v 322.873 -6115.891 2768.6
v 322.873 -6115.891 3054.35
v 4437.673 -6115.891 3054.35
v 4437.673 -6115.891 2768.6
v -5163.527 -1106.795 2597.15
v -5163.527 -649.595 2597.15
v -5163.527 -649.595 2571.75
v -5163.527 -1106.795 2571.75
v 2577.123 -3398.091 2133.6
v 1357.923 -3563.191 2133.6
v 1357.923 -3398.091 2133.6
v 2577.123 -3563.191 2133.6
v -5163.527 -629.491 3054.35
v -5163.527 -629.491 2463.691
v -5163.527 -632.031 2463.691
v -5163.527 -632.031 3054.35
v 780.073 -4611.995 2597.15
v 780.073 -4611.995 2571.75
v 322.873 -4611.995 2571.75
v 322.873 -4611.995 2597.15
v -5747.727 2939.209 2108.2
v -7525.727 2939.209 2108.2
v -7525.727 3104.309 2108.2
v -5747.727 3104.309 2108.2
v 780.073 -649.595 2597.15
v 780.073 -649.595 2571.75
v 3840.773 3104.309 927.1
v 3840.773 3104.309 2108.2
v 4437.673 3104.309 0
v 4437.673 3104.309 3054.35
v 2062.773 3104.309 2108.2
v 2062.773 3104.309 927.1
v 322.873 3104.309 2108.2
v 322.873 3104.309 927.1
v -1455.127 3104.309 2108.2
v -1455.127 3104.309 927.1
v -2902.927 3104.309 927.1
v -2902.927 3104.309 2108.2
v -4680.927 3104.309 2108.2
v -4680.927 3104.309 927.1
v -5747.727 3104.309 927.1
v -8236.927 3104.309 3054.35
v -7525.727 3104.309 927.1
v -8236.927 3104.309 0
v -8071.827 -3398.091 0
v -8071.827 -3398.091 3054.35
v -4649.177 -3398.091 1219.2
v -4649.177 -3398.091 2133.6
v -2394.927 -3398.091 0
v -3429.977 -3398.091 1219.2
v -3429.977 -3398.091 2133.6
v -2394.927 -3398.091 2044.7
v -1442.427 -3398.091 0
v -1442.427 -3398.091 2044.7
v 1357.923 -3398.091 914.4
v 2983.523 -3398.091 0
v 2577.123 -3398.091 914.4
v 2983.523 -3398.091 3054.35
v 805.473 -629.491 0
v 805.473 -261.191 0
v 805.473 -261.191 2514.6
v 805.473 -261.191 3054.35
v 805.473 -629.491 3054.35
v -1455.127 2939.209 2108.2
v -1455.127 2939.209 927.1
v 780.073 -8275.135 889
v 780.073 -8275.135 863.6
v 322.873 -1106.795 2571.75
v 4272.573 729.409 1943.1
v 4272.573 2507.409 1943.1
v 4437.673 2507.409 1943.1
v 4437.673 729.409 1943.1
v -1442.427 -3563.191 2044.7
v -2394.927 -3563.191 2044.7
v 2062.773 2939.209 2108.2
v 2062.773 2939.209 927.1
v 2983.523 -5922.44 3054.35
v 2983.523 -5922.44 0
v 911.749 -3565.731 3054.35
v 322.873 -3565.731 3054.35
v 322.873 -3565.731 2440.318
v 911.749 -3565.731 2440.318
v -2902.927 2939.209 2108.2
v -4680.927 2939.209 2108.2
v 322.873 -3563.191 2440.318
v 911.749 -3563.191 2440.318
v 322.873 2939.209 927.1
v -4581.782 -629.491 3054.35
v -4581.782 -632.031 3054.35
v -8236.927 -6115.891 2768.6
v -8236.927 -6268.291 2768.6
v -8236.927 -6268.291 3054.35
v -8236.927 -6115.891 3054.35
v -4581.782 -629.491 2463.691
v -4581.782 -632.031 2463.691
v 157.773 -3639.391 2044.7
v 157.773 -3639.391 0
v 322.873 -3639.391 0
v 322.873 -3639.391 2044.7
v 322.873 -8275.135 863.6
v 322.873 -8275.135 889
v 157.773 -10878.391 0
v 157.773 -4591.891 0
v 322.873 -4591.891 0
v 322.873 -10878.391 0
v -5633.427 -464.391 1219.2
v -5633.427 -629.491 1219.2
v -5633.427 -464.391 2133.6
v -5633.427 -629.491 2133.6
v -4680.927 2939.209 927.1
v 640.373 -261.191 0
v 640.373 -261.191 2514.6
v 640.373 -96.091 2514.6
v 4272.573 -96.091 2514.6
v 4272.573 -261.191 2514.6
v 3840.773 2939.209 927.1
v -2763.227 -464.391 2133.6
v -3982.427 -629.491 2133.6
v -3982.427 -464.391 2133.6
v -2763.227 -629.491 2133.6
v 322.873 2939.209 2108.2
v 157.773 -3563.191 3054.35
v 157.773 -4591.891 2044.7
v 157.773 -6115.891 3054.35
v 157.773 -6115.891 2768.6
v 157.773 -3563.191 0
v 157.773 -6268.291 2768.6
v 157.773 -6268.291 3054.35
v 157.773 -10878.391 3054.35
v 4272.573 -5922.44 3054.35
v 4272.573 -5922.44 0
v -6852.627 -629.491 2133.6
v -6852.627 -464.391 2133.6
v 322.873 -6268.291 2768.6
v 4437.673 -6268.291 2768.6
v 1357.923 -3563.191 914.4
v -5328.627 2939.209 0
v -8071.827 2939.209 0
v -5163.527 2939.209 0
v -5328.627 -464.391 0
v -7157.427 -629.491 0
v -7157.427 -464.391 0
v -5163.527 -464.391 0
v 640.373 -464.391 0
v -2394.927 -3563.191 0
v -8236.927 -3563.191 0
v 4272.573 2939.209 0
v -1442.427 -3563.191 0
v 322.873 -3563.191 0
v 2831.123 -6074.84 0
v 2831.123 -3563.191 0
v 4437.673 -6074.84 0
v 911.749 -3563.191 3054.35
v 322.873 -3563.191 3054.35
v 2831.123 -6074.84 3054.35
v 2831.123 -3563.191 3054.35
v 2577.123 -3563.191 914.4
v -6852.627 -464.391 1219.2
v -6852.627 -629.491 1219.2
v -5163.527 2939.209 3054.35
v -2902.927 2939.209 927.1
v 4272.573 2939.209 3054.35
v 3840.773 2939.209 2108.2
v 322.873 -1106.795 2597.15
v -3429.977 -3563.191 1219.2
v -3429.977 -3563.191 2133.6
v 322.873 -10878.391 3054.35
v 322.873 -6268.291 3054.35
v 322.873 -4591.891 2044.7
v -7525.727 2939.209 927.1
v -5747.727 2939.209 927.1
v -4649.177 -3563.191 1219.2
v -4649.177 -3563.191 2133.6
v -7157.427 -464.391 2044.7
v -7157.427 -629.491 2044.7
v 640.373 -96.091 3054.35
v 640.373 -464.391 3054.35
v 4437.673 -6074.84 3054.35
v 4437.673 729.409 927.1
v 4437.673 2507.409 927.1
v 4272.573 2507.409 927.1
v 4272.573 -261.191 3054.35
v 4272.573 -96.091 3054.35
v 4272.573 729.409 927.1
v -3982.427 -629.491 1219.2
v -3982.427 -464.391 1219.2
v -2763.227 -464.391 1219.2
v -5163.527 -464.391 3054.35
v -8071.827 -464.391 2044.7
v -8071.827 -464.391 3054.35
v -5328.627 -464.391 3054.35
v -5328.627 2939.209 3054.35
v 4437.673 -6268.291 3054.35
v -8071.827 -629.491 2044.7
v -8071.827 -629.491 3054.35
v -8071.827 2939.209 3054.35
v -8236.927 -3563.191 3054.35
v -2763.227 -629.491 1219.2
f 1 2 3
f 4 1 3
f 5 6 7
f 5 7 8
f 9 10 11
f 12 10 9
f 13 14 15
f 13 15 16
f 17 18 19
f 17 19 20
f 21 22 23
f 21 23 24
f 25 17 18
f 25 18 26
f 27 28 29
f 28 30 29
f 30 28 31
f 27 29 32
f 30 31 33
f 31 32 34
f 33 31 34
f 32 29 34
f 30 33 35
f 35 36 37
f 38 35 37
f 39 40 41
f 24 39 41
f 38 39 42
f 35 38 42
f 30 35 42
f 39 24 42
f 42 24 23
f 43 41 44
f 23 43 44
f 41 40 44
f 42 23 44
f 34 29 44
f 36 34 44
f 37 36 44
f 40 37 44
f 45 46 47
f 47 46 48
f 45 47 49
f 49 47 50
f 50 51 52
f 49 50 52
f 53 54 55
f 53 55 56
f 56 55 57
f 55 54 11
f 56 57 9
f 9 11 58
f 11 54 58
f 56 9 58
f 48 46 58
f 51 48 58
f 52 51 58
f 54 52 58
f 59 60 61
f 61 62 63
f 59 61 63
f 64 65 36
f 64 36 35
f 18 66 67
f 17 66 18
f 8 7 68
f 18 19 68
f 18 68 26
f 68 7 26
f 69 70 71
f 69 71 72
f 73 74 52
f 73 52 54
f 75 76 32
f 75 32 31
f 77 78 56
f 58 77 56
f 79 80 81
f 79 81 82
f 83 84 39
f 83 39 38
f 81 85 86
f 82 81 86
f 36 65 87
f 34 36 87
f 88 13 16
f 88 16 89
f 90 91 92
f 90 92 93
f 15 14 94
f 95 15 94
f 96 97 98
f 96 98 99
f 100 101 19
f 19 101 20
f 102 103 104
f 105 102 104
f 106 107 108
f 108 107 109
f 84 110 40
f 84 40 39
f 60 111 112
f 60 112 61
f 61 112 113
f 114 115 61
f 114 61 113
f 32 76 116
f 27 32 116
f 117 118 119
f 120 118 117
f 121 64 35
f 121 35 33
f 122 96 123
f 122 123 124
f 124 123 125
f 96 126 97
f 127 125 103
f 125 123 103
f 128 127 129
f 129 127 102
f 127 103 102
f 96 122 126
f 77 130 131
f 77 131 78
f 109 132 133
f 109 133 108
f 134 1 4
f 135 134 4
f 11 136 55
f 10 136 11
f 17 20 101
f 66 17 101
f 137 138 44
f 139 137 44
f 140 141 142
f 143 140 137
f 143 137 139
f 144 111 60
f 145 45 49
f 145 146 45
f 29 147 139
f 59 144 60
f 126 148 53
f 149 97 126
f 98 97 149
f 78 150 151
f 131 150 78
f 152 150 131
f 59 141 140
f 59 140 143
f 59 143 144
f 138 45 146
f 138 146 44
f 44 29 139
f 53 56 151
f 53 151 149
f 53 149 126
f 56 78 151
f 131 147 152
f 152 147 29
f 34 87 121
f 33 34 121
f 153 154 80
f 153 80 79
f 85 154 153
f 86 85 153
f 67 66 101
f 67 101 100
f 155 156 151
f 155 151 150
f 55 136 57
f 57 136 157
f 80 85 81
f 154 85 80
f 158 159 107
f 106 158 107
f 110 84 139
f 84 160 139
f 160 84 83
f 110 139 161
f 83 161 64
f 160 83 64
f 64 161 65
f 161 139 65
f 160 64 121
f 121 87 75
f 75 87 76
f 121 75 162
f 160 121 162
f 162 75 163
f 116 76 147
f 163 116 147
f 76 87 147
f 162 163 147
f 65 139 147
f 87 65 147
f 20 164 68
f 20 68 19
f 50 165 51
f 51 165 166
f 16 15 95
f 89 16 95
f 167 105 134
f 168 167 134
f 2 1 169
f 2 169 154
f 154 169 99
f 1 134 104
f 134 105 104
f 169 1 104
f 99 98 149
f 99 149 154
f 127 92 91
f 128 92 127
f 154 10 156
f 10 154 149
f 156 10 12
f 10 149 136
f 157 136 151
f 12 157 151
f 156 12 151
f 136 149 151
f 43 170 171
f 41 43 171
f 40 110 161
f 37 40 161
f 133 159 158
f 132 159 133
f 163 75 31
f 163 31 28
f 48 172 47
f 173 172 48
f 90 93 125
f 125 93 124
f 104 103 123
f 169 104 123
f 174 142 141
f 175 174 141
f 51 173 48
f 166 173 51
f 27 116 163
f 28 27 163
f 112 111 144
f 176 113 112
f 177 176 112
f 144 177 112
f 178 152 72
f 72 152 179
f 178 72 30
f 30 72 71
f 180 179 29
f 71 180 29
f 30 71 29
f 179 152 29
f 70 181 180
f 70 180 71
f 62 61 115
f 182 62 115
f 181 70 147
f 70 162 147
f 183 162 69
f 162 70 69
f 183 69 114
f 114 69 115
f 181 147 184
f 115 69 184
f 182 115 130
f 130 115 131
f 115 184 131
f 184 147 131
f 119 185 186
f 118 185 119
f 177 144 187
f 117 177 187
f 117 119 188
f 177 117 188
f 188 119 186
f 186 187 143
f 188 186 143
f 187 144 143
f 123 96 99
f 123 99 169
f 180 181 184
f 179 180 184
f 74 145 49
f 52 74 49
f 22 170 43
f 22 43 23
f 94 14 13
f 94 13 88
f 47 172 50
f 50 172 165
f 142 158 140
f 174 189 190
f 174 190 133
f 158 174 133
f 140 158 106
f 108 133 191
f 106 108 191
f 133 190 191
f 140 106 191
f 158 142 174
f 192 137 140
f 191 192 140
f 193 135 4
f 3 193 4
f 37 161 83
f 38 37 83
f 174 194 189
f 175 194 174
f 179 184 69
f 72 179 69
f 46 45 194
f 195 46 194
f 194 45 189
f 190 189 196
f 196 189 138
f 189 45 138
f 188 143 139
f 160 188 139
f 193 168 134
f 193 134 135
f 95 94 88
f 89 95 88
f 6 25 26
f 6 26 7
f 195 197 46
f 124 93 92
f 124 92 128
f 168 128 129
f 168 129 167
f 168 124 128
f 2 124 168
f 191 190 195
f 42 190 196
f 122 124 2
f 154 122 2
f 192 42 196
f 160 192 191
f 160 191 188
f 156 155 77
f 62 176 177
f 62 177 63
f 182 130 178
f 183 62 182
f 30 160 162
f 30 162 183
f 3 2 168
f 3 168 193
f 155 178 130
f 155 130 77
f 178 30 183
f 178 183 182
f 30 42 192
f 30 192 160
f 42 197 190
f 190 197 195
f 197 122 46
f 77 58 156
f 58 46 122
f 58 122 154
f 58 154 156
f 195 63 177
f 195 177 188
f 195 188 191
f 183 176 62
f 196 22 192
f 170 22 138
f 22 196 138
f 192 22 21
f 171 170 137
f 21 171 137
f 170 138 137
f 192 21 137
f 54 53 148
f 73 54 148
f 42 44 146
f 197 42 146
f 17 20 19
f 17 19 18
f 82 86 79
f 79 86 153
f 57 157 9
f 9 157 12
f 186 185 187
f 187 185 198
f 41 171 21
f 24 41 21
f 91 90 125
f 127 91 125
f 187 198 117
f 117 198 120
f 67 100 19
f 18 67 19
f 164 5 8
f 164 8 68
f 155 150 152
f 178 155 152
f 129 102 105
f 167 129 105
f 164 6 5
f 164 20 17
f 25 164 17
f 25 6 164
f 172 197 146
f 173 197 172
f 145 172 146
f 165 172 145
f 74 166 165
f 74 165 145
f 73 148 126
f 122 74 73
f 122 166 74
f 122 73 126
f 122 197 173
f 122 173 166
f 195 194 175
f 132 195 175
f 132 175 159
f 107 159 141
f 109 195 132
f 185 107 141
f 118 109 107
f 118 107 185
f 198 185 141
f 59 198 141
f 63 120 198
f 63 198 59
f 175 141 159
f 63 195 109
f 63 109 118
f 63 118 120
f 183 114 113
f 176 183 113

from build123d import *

# Parameters (mm, degrees)
F1_DEPTH  = 3054.35
F2_W      = 1219.2
F2_H      = 914.4
F3_DEPTH  = 165.1
F4_W      = 1778
F4_H      = 1181.1
F5_DEPTH  = 165.101
F6_W      = 1778
F6_H      = 1016
F7_DEPTH  = 165.101
F11_DEPTH = 3054.35
F12_W     = 3467.1
F12_H     = 2514.6
F13_DEPTH = 165.1
F14_W     = 952.5
F14_H     = 2044.7
F15_DEPTH = 165.1
F16_W     = 914.4
F16_H     = 1009.65
F17_DEPTH = 165.1
F18_W     = 952.5
F18_H     = 1009.65
F19_DEPTH = 165.1
F20_W     = 12674.6
F20_H     = 152.4
F21_DEPTH = 285.75
F22_W     = 1219.2
F22_H     = 1219.2
F22_H_2   = 914.4
F23_DEPTH = 165.1
F24_W     = 368.3
F24_H     = 2514.6
F25_DEPTH = 165.1
F26_W     = 165.1
F26_H     = 203.2
F27_DEPTH = 2514.6
F30_DEPTH = 25.4
F32_DEPTH = 457.2
F33_W     = 588.8758589745
F33_H     = 614.0316539764
F34_DEPTH = 2.54
F35_W     = 581.7451477051
F35_H     = 590.6585269928
F36_DEPTH = 2.54


with BuildPart() as f1:
    # F0 (on Top) → F1 (new body)
    with BuildSketch(Plane.XY):
        Polygon((-8071.8270324707, -464.391151869), (-8071.8270324707, 2939.208848131), (-5328.6270324707, 2939.208848131), (-5328.6270324707, -464.391151869), (-7157.4270324707, -464.391151869), (-7157.4270324707, -629.491151869), (-5163.5270324707, -629.491151869), (-4249.1270324707, -629.491151869), (805.4729675293, -629.491151869), (805.4729675293, -464.391151869), (640.3729675293, -464.391151869), (-4249.1270324707, -464.391151869), (-5163.5270324707, -464.391151869), (-5163.5270324707, 2939.208848131), (4272.5729675293, 2939.208848131), (4272.5729675293, 48.6404670191), (4272.5729675293, -116.4595329809), (4272.5729675293, -3398.091151869), (4272.5729675293, -5922.4400688171), (2983.5229675293, -5922.4400688171), (2983.5229675293, -3398.091151869), (-1442.4270324707, -3398.091151869), (-1442.4270324707, -3563.191151869), (157.7729675293, -3563.191151869), (157.7729675293, -10878.391151869), (322.8729675293, -10878.391151869), (322.8729675293, -3563.191151869), (2831.1229675293, -3563.191151869), (2831.1229675293, -6074.8400688171), (4437.6729675293, -6074.8400688171), (4437.6729675293, -3398.091151869), (4437.6729675293, 3104.308848131), (-8236.9270324707, 3104.308848131), (-8236.9270324707, -3563.191151869), (-2394.9270324707, -3563.191151869), (-2394.9270324707, -3398.091151869), (-8071.8270324707, -3398.091151869), (-8071.8270324707, -629.491151869), align=None)
    extrude(amount=F1_DEPTH)

    # F2 (on face) → F3 (cut, through all)
    with BuildSketch(Plane.XZ.offset(629.491151869)):
        with Locations((-6243.0270324707, 1676.4)):
            Rectangle(F2_W, F2_H)
        with Locations((-3372.8270324707, 1676.4)):
            Rectangle(F2_W, F2_H)
    extrude(amount=-F3_DEPTH, mode=Mode.SUBTRACT)

    # F4 (on face) → F5 (cut, through all)
    with BuildSketch(Plane.XZ.offset(-2939.208848131)):
        with Locations((-6636.7270324707, 1517.65)):
            Rectangle(F4_W, F4_H)
        with Locations((-3791.9270324707, 1517.65)):
            Rectangle(F4_W, F4_H)
        with Locations((-566.1270324707, 1517.65)):
            Rectangle(F4_W, F4_H)
        with Locations((2951.7729675293, 1517.65)):
            Rectangle(F4_W, F4_H)
    extrude(amount=-F5_DEPTH, mode=Mode.SUBTRACT)

    # F6 (on face) → F7 (cut, through all)
    with BuildSketch(Plane(origin=(4272.5729675293, 0, 0), x_dir=(0, -1, 0), z_dir=(-1, 0, 0))):
        with Locations((-1618.408848131, 1435.1)):
            Rectangle(F6_W, F6_H)
    extrude(amount=-F7_DEPTH, mode=Mode.SUBTRACT)

    # F10 (on Top) → F11 (join, through all)
    with BuildSketch(Plane.XY):
        Polygon((4272.5729675293, -96.091151869), (640.3729675293, -96.091151869), (640.3729675293, -464.391151869), (805.4729675293, -464.391151869), (805.4729675293, -261.191151869), (4272.5729675293, -261.191151869), align=None)
    extrude(amount=F11_DEPTH)

    # F12 (on face) → F13 (cut, through all)
    with BuildSketch(Plane.XZ.offset(261.191151869)):
        with Locations((2539.0229675293, 1257.3)):
            Rectangle(F12_W, F12_H)
    extrude(amount=-F13_DEPTH, mode=Mode.SUBTRACT)

    # F14 (on face) → F15 (cut, through all)
    with BuildSketch(Plane(origin=(157.7729675293, 0, 0), x_dir=(0, -1, 0), z_dir=(-1, 0, 0))):
        with Locations((4115.641151869, 1022.35)):
            Rectangle(F14_W, F14_H)
    extrude(amount=-F15_DEPTH, mode=Mode.SUBTRACT)

    # F16 (on face) → F17 (join)
    with BuildSketch(Plane.XZ.offset(629.491151869)):
        with Locations((-7614.6270324707, 2549.525)):
            Rectangle(F16_W, F16_H)
    extrude(amount=-F17_DEPTH)

    # F18 (on face) → F19 (join)
    with BuildSketch(Plane.XZ.offset(3563.191151869)):
        with Locations((-1918.6770324707, 2549.525)):
            Rectangle(F18_W, F18_H)
    extrude(amount=-F19_DEPTH)

    # F20 (on face) → F21 (join)
    with BuildSketch(Plane.XY.offset(3054.35)):
        with Locations((-1899.6270324707, -6192.091151869)):
            Rectangle(F20_W, F20_H)
    extrude(amount=-F21_DEPTH)

    # F22 (on face) → F23 (cut, through all)
    with BuildSketch(Plane.XZ.offset(3563.191151869)):
        with Locations((1967.5229675293, 1524)):
            Rectangle(F22_W, F22_H)
        with Locations((-4039.5770324707, 1676.4)):
            Rectangle(F22_W, F22_H_2)
    extrude(amount=-F23_DEPTH, mode=Mode.SUBTRACT)

    # F24 (on face) → F25 (cut, through all)
    with BuildSketch(Plane.YZ.offset(805.4729675293)):
        with Locations((-280.241151869, 1257.3)):
            Rectangle(F24_W, F24_H)
    extrude(amount=-F25_DEPTH, mode=Mode.SUBTRACT)

    # F26 (on face) → F27 (join, through all)
    with BuildSketch(Plane(origin=(0, 0, 2514.6), x_dir=(1, 0, 0), z_dir=(0, 0, -1))):
        with Locations((722.9229675293, 362.791151869)):
            Rectangle(F26_W, F26_H)
    extrude(amount=F27_DEPTH)


with BuildPart() as f30:
    # F29 (on offset) → F30 (new body)
    with BuildSketch(Plane.XY.offset(2597.15)):
        Polygon((322.8729675293, -649.5954301834), (-5163.5270324707, -649.5954301834), (-5163.5270324707, -1106.7954301834), (322.8729675293, -1106.7954301834), (322.8729675293, -4611.9954301834), (780.0729675293, -4611.9954301834), (780.0729675293, -649.5954301834), align=None)
    extrude(amount=-F30_DEPTH)


with BuildPart() as f32:
    # F31 (on face) → F32 (new body)
    with BuildSketch(Plane.YZ.offset(322.8729675293)):
        Polygon((-8275.1349264518, 863.6), (-4611.9954301834, 2571.75), (-4611.9954301834, 2597.15), (-8275.1349264518, 889), align=None)
    extrude(amount=F32_DEPTH)


with BuildPart() as f34:
    # F33 (on face) → F34 (new body)
    with BuildSketch(Plane.XZ.offset(3563.191151869)):
        with Locations((617.3108970165, 2747.3341730118)):
            Rectangle(F33_W, F33_H)
    extrude(amount=F34_DEPTH)


with BuildPart() as f36:
    # F35 (on face) → F36 (new body)
    with BuildSketch(Plane.XZ.offset(629.491151869)):
        with Locations((-4872.6544586182, 2759.0207365036)):
            Rectangle(F35_W, F35_H)
    extrude(amount=F36_DEPTH)


solid = Compound([f1.part, f30.part, f32.part, f34.part, f36.part])
